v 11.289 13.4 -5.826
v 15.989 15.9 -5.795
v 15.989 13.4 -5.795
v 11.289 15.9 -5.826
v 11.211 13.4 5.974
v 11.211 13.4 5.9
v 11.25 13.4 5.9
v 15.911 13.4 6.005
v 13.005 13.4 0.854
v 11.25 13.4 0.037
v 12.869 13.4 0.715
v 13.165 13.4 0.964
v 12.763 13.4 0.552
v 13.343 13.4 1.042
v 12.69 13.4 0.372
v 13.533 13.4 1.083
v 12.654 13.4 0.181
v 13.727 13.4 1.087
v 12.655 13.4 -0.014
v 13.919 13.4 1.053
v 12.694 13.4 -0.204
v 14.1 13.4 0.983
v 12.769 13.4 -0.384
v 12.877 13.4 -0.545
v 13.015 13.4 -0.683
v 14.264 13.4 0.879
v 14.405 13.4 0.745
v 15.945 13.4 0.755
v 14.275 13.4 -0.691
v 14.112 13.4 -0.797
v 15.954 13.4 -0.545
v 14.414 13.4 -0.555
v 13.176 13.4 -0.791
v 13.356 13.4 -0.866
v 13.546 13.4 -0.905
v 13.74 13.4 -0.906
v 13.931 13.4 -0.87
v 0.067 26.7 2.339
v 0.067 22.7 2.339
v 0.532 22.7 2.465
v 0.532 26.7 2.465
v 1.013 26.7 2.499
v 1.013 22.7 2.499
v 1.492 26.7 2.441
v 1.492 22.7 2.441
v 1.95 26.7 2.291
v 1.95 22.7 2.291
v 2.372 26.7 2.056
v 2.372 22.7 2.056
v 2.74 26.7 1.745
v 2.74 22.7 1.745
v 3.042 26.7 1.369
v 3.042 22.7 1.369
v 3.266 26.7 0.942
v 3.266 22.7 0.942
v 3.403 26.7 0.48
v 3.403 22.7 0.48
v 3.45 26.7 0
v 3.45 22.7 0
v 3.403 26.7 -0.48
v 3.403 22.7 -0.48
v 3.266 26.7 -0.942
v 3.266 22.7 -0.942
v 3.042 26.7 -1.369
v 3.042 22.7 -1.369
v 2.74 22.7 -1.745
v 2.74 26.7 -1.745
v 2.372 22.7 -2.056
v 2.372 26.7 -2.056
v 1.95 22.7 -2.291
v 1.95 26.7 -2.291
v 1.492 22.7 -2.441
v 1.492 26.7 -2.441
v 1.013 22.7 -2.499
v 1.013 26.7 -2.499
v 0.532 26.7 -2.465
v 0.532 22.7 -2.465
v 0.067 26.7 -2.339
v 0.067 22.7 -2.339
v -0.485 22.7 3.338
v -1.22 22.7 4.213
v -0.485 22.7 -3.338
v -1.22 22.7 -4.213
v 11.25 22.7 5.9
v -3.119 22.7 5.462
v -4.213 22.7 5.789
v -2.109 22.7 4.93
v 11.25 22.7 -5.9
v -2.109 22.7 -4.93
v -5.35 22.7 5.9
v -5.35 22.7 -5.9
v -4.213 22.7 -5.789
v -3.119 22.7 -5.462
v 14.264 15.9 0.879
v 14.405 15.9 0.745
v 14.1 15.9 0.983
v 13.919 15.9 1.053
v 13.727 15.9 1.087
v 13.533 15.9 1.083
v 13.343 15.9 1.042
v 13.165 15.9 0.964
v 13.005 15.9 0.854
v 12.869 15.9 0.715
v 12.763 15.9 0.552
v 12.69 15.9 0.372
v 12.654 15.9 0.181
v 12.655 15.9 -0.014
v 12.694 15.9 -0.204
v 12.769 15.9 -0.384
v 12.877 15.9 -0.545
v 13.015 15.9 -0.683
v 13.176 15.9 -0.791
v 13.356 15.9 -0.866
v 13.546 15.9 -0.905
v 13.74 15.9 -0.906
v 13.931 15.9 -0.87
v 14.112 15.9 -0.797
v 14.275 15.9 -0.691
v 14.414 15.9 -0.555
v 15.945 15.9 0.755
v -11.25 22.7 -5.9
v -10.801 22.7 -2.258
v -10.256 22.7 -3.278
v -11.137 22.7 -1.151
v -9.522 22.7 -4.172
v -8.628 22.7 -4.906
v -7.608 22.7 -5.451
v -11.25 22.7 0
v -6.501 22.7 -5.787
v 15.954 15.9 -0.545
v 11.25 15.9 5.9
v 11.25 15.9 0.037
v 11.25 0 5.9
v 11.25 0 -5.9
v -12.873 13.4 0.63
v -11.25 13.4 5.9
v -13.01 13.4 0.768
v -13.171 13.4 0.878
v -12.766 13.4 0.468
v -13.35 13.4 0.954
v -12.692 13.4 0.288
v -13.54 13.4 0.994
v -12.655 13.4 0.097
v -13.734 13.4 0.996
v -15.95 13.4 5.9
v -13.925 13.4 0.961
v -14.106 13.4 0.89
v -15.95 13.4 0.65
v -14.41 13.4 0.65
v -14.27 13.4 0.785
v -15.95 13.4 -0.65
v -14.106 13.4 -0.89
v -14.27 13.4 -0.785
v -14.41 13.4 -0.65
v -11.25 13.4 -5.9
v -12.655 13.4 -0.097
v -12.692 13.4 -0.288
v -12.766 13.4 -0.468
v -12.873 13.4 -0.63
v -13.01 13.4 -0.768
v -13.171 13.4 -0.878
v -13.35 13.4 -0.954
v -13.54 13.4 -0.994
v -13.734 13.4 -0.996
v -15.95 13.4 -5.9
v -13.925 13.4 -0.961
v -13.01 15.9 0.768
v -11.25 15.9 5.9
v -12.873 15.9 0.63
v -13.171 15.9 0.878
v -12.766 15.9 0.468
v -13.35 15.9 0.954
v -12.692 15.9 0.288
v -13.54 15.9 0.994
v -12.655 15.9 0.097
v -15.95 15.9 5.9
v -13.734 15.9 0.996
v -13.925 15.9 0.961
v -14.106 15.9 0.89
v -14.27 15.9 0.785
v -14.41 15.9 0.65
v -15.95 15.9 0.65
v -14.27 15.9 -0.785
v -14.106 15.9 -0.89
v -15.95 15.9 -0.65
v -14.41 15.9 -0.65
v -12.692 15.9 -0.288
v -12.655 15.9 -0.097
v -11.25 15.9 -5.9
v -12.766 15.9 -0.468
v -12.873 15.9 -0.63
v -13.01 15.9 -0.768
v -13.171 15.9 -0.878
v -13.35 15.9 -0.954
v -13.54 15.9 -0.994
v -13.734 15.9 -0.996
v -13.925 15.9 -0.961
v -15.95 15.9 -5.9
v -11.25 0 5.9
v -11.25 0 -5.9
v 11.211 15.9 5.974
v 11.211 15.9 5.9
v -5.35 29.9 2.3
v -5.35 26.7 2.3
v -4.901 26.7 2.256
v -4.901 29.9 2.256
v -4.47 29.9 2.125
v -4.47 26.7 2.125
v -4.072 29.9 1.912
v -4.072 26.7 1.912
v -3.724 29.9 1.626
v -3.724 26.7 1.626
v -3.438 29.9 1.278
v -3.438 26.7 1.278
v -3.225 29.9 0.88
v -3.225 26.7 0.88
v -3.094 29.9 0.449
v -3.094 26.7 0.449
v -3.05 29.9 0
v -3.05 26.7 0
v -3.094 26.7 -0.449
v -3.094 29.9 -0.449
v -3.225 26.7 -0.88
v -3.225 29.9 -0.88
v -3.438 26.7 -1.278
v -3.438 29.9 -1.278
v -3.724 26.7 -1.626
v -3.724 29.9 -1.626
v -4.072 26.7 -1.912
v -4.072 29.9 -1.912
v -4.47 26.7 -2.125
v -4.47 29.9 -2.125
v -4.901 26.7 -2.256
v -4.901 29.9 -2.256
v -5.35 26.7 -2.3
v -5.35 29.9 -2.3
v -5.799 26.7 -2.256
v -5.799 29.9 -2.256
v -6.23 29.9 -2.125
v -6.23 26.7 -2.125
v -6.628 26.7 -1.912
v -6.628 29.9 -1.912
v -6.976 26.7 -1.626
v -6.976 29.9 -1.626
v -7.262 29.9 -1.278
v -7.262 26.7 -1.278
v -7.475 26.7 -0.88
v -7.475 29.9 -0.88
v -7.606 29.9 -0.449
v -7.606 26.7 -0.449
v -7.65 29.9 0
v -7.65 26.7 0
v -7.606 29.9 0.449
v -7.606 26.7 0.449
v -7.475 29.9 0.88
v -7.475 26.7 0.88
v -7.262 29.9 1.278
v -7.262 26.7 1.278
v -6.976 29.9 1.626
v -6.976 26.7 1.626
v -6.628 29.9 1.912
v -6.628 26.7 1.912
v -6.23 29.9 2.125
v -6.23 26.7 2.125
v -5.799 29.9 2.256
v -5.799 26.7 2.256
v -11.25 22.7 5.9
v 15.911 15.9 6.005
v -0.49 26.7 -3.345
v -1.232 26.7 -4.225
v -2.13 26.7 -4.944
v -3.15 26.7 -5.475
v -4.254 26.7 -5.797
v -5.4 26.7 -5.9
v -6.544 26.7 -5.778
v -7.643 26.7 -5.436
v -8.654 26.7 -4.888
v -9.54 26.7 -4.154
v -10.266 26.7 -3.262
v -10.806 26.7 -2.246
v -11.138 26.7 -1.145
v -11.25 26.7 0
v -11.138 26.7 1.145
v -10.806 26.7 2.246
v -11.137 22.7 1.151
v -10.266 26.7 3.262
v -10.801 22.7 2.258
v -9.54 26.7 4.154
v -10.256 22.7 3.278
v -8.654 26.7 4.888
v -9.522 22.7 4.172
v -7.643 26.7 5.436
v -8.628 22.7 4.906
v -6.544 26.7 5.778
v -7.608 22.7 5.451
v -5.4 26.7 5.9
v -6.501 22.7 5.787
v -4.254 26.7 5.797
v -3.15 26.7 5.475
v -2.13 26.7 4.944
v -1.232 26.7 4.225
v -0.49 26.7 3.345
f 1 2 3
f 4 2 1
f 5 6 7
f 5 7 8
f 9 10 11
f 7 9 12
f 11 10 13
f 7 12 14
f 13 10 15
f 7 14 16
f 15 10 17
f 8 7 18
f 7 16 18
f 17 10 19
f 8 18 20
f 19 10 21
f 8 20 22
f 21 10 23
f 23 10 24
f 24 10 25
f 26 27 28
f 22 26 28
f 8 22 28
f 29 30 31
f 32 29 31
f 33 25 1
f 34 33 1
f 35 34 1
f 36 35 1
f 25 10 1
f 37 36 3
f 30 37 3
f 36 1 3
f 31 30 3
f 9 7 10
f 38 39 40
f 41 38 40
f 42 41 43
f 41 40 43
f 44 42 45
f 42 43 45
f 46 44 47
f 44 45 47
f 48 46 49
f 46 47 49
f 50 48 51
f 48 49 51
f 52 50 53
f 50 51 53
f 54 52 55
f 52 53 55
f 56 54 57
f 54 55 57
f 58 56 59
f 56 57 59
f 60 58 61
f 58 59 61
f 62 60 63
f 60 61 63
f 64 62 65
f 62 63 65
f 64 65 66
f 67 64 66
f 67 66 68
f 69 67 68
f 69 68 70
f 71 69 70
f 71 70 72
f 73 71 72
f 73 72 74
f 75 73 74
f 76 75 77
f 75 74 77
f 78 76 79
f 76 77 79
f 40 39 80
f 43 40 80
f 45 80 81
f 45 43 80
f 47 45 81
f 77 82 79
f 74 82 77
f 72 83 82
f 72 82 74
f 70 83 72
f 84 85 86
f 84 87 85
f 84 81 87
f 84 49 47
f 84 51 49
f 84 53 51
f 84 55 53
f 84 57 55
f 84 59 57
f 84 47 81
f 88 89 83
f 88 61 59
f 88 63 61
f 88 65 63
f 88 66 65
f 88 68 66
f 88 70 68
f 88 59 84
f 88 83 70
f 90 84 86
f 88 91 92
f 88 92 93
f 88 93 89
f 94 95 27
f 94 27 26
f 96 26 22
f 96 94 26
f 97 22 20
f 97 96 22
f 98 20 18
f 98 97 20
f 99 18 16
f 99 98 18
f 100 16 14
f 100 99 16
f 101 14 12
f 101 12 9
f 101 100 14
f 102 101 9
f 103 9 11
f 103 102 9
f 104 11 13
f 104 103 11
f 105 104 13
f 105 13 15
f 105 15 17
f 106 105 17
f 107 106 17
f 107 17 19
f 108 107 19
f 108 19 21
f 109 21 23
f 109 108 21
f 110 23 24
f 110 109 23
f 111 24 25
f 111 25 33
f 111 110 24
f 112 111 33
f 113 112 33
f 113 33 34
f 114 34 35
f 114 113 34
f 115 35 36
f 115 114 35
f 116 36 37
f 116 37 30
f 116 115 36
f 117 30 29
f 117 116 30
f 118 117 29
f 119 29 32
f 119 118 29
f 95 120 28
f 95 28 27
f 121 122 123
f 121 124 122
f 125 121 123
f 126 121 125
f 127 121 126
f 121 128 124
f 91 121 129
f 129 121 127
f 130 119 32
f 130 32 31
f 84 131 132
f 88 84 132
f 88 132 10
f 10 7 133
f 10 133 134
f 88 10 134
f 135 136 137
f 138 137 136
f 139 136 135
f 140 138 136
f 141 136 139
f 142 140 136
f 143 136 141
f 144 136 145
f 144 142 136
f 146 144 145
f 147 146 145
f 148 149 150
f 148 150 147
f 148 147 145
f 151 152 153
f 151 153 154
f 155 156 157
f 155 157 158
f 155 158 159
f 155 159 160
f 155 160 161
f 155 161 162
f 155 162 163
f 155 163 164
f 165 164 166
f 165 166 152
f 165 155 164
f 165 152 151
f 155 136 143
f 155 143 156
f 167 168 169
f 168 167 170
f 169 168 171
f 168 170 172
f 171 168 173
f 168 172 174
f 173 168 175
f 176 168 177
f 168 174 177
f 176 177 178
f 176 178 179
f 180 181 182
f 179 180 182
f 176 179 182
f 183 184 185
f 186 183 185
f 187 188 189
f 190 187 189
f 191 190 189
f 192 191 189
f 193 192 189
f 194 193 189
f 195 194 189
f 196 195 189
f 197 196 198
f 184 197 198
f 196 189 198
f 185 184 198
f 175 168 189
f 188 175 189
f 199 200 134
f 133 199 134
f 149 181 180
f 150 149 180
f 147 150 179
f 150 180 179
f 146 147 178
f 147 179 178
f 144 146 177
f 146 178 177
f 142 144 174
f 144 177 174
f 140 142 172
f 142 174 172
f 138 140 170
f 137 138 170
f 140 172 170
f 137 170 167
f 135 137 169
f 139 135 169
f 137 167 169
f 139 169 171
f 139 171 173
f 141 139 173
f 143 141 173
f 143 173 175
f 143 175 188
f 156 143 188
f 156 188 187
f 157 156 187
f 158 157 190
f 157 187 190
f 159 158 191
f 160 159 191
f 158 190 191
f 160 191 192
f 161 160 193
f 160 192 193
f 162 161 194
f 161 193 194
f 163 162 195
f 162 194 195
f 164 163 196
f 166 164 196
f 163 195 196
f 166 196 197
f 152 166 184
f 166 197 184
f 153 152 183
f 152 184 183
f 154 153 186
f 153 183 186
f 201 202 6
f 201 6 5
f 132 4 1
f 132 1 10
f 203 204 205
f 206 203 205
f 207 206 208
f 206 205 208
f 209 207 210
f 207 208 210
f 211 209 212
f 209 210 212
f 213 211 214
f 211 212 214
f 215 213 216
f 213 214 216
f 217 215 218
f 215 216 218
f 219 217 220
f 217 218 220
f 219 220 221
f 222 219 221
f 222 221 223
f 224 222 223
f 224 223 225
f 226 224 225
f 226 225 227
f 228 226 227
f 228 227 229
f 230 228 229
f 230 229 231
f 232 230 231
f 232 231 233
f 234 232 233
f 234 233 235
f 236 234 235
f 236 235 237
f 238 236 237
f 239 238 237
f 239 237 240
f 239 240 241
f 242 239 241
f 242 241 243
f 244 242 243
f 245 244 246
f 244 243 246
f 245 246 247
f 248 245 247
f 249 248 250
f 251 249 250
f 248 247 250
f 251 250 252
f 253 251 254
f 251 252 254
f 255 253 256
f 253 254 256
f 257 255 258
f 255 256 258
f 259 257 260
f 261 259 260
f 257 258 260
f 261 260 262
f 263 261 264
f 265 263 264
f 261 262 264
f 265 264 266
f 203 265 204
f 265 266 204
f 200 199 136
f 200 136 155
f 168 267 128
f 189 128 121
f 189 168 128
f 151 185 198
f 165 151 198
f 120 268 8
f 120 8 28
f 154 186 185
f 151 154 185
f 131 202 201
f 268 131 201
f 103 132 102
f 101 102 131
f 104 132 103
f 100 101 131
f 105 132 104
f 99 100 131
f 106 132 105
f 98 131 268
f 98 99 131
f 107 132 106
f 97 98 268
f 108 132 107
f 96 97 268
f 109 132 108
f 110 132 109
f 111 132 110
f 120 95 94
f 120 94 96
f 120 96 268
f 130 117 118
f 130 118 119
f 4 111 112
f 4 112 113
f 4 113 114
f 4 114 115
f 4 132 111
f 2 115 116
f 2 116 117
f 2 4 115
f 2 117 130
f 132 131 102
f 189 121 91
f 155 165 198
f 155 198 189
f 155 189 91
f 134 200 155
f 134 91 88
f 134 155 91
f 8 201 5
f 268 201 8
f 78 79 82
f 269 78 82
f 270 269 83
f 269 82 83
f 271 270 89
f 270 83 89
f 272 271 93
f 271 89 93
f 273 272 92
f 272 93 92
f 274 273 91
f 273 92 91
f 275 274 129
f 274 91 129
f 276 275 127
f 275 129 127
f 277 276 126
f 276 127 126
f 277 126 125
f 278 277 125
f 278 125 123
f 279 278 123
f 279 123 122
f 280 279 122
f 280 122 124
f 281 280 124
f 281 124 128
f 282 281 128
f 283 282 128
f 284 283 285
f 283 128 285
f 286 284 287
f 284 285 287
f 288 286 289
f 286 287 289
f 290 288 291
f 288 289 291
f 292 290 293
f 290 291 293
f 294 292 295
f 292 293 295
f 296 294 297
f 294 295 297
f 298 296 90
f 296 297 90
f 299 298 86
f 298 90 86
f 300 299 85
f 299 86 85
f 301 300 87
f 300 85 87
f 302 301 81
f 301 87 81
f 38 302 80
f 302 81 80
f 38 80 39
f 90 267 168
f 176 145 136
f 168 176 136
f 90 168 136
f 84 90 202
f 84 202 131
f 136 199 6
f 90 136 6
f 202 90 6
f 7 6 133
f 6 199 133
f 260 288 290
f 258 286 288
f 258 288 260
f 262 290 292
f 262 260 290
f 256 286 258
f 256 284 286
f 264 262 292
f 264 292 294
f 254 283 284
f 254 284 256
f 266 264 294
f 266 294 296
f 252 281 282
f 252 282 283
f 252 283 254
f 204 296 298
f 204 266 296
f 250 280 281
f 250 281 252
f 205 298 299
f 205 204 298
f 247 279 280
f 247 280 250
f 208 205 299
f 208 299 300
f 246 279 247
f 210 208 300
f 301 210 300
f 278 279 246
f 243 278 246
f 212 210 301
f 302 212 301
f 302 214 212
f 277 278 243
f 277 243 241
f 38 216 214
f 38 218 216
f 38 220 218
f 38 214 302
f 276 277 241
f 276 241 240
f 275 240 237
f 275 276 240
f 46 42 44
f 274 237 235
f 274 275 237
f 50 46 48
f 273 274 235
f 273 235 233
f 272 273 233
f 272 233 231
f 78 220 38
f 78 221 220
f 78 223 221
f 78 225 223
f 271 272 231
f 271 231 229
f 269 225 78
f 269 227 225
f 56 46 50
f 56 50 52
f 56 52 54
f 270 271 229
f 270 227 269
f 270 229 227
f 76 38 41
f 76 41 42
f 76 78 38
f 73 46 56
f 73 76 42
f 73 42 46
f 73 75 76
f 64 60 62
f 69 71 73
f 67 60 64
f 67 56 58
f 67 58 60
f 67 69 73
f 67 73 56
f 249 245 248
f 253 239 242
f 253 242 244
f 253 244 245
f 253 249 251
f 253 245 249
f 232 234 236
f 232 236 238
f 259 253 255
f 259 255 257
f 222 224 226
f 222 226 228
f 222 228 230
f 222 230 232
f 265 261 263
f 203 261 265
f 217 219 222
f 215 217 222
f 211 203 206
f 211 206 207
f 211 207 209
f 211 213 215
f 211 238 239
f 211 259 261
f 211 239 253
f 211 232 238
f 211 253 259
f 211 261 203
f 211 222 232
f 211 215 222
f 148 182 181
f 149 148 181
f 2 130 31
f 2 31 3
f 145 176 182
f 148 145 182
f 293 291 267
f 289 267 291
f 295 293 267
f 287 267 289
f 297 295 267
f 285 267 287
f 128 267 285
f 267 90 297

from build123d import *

# Parameters (mm, degrees)
CROQUIS1_W              = 22.5
CROQUIS1_H              = 11.8
SALIENTE_EXTRUIR1_DEPTH = 22.7
CROQUIS2_R              = 2.3
SALIENTE_EXTRUIR2_DEPTH = 4
CROQUIS3_R              = 2.3
SALIENTE_EXTRUIR3_DEPTH = 7.2
SALIENTE_EXTRUIR4_START = -6.8
SALIENTE_EXTRUIR4_DEPTH = 2.5


with BuildPart() as part:
    # Croquis1 → Saliente-Extruir1 (new body)
    with BuildSketch(Plane(origin=(0, 0, 0), x_dir=(1, 0, 0), z_dir=(0, 1, 0))):
        Rectangle(CROQUIS1_W, CROQUIS1_H)
    extrude(amount=SALIENTE_EXTRUIR1_DEPTH)

    # Croquis2 → Saliente-Extruir2 (add)
    with BuildSketch(Plane(origin=(0, 22.7, 0), x_dir=(1, 0, 0), z_dir=(0, 1, 0))):
        with BuildLine():
            ThreePointArc((0.066666667, 2.338743727), (-6.544082671, 5.777903303), (-11.25, -7.9e-08))
            ThreePointArc((-11.25, -7.9e-08), (-6.544082594, -5.777903319), (0.066666667, -2.338743727))
            ThreePointArc((0.066666667, -2.338743727), (3.45, 0), (0.066666667, 2.338743727))
        make_face()
        with Locations((-5.35, 0)):
            Circle(CROQUIS2_R, mode=Mode.SUBTRACT)
    extrude(amount=SALIENTE_EXTRUIR2_DEPTH)

    # Croquis3 → Saliente-Extruir3 (add)
    with BuildSketch(Plane(origin=(0, 22.7, 0), x_dir=(1, 0, 0), z_dir=(0, 1, 0))):
        with Locations((-5.35, 0)):
            Circle(CROQUIS3_R)
    extrude(amount=SALIENTE_EXTRUIR3_DEPTH)

    # Croquis2<3> → Saliente-Extruir4 (add)
    with BuildSketch(Plane(origin=(0, 22.7, 0), x_dir=(1, 0, 0), z_dir=(0, 1, 0)).offset(SALIENTE_EXTRUIR4_START)):
        with BuildLine():
            Line((-11.25, 5.9), (-11.25, -5.9))
            Line((-11.25, -5.9), (-15.95, -5.9))
            Line((-15.95, -5.9), (-15.95, -0.65))
            Line((-15.95, -0.65), (-14.409934208, -0.65))
            ThreePointArc((-14.409934208, -0.65), (-12.65, 0), (-14.409934208, 0.65))
            Line((-14.409934208, 0.65), (-15.95, 0.65))
            Line((-15.95, 0.65), (-15.95, 5.9))
            Line((-15.95, 5.9), (-11.25, 5.9))
        make_face()
        with BuildLine():
            Line((15.988536906, 5.794755181), (11.288638975, 5.825730005))
            Line((11.288638975, 5.825730005), (11.210872396, -5.974013736))
            Line((11.210872396, -5.974013736), (15.910770327, -6.00498856))
            Line((15.910770327, -6.00498856), (15.945369864, -0.755102574))
            Line((15.945369864, -0.755102574), (14.405337517, -0.744952943))
            ThreePointArc((14.405337517, -0.744952943), (12.649725282, -0.083368409), (14.413905022, 0.555018825))
            Line((14.413905022, 0.555018825), (15.953937369, 0.544869194))
            Line((15.953937369, 0.544869194), (15.988536906, 5.794755181))
        make_face()
    extrude(amount=-SALIENTE_EXTRUIR4_DEPTH)


solid = part.part
